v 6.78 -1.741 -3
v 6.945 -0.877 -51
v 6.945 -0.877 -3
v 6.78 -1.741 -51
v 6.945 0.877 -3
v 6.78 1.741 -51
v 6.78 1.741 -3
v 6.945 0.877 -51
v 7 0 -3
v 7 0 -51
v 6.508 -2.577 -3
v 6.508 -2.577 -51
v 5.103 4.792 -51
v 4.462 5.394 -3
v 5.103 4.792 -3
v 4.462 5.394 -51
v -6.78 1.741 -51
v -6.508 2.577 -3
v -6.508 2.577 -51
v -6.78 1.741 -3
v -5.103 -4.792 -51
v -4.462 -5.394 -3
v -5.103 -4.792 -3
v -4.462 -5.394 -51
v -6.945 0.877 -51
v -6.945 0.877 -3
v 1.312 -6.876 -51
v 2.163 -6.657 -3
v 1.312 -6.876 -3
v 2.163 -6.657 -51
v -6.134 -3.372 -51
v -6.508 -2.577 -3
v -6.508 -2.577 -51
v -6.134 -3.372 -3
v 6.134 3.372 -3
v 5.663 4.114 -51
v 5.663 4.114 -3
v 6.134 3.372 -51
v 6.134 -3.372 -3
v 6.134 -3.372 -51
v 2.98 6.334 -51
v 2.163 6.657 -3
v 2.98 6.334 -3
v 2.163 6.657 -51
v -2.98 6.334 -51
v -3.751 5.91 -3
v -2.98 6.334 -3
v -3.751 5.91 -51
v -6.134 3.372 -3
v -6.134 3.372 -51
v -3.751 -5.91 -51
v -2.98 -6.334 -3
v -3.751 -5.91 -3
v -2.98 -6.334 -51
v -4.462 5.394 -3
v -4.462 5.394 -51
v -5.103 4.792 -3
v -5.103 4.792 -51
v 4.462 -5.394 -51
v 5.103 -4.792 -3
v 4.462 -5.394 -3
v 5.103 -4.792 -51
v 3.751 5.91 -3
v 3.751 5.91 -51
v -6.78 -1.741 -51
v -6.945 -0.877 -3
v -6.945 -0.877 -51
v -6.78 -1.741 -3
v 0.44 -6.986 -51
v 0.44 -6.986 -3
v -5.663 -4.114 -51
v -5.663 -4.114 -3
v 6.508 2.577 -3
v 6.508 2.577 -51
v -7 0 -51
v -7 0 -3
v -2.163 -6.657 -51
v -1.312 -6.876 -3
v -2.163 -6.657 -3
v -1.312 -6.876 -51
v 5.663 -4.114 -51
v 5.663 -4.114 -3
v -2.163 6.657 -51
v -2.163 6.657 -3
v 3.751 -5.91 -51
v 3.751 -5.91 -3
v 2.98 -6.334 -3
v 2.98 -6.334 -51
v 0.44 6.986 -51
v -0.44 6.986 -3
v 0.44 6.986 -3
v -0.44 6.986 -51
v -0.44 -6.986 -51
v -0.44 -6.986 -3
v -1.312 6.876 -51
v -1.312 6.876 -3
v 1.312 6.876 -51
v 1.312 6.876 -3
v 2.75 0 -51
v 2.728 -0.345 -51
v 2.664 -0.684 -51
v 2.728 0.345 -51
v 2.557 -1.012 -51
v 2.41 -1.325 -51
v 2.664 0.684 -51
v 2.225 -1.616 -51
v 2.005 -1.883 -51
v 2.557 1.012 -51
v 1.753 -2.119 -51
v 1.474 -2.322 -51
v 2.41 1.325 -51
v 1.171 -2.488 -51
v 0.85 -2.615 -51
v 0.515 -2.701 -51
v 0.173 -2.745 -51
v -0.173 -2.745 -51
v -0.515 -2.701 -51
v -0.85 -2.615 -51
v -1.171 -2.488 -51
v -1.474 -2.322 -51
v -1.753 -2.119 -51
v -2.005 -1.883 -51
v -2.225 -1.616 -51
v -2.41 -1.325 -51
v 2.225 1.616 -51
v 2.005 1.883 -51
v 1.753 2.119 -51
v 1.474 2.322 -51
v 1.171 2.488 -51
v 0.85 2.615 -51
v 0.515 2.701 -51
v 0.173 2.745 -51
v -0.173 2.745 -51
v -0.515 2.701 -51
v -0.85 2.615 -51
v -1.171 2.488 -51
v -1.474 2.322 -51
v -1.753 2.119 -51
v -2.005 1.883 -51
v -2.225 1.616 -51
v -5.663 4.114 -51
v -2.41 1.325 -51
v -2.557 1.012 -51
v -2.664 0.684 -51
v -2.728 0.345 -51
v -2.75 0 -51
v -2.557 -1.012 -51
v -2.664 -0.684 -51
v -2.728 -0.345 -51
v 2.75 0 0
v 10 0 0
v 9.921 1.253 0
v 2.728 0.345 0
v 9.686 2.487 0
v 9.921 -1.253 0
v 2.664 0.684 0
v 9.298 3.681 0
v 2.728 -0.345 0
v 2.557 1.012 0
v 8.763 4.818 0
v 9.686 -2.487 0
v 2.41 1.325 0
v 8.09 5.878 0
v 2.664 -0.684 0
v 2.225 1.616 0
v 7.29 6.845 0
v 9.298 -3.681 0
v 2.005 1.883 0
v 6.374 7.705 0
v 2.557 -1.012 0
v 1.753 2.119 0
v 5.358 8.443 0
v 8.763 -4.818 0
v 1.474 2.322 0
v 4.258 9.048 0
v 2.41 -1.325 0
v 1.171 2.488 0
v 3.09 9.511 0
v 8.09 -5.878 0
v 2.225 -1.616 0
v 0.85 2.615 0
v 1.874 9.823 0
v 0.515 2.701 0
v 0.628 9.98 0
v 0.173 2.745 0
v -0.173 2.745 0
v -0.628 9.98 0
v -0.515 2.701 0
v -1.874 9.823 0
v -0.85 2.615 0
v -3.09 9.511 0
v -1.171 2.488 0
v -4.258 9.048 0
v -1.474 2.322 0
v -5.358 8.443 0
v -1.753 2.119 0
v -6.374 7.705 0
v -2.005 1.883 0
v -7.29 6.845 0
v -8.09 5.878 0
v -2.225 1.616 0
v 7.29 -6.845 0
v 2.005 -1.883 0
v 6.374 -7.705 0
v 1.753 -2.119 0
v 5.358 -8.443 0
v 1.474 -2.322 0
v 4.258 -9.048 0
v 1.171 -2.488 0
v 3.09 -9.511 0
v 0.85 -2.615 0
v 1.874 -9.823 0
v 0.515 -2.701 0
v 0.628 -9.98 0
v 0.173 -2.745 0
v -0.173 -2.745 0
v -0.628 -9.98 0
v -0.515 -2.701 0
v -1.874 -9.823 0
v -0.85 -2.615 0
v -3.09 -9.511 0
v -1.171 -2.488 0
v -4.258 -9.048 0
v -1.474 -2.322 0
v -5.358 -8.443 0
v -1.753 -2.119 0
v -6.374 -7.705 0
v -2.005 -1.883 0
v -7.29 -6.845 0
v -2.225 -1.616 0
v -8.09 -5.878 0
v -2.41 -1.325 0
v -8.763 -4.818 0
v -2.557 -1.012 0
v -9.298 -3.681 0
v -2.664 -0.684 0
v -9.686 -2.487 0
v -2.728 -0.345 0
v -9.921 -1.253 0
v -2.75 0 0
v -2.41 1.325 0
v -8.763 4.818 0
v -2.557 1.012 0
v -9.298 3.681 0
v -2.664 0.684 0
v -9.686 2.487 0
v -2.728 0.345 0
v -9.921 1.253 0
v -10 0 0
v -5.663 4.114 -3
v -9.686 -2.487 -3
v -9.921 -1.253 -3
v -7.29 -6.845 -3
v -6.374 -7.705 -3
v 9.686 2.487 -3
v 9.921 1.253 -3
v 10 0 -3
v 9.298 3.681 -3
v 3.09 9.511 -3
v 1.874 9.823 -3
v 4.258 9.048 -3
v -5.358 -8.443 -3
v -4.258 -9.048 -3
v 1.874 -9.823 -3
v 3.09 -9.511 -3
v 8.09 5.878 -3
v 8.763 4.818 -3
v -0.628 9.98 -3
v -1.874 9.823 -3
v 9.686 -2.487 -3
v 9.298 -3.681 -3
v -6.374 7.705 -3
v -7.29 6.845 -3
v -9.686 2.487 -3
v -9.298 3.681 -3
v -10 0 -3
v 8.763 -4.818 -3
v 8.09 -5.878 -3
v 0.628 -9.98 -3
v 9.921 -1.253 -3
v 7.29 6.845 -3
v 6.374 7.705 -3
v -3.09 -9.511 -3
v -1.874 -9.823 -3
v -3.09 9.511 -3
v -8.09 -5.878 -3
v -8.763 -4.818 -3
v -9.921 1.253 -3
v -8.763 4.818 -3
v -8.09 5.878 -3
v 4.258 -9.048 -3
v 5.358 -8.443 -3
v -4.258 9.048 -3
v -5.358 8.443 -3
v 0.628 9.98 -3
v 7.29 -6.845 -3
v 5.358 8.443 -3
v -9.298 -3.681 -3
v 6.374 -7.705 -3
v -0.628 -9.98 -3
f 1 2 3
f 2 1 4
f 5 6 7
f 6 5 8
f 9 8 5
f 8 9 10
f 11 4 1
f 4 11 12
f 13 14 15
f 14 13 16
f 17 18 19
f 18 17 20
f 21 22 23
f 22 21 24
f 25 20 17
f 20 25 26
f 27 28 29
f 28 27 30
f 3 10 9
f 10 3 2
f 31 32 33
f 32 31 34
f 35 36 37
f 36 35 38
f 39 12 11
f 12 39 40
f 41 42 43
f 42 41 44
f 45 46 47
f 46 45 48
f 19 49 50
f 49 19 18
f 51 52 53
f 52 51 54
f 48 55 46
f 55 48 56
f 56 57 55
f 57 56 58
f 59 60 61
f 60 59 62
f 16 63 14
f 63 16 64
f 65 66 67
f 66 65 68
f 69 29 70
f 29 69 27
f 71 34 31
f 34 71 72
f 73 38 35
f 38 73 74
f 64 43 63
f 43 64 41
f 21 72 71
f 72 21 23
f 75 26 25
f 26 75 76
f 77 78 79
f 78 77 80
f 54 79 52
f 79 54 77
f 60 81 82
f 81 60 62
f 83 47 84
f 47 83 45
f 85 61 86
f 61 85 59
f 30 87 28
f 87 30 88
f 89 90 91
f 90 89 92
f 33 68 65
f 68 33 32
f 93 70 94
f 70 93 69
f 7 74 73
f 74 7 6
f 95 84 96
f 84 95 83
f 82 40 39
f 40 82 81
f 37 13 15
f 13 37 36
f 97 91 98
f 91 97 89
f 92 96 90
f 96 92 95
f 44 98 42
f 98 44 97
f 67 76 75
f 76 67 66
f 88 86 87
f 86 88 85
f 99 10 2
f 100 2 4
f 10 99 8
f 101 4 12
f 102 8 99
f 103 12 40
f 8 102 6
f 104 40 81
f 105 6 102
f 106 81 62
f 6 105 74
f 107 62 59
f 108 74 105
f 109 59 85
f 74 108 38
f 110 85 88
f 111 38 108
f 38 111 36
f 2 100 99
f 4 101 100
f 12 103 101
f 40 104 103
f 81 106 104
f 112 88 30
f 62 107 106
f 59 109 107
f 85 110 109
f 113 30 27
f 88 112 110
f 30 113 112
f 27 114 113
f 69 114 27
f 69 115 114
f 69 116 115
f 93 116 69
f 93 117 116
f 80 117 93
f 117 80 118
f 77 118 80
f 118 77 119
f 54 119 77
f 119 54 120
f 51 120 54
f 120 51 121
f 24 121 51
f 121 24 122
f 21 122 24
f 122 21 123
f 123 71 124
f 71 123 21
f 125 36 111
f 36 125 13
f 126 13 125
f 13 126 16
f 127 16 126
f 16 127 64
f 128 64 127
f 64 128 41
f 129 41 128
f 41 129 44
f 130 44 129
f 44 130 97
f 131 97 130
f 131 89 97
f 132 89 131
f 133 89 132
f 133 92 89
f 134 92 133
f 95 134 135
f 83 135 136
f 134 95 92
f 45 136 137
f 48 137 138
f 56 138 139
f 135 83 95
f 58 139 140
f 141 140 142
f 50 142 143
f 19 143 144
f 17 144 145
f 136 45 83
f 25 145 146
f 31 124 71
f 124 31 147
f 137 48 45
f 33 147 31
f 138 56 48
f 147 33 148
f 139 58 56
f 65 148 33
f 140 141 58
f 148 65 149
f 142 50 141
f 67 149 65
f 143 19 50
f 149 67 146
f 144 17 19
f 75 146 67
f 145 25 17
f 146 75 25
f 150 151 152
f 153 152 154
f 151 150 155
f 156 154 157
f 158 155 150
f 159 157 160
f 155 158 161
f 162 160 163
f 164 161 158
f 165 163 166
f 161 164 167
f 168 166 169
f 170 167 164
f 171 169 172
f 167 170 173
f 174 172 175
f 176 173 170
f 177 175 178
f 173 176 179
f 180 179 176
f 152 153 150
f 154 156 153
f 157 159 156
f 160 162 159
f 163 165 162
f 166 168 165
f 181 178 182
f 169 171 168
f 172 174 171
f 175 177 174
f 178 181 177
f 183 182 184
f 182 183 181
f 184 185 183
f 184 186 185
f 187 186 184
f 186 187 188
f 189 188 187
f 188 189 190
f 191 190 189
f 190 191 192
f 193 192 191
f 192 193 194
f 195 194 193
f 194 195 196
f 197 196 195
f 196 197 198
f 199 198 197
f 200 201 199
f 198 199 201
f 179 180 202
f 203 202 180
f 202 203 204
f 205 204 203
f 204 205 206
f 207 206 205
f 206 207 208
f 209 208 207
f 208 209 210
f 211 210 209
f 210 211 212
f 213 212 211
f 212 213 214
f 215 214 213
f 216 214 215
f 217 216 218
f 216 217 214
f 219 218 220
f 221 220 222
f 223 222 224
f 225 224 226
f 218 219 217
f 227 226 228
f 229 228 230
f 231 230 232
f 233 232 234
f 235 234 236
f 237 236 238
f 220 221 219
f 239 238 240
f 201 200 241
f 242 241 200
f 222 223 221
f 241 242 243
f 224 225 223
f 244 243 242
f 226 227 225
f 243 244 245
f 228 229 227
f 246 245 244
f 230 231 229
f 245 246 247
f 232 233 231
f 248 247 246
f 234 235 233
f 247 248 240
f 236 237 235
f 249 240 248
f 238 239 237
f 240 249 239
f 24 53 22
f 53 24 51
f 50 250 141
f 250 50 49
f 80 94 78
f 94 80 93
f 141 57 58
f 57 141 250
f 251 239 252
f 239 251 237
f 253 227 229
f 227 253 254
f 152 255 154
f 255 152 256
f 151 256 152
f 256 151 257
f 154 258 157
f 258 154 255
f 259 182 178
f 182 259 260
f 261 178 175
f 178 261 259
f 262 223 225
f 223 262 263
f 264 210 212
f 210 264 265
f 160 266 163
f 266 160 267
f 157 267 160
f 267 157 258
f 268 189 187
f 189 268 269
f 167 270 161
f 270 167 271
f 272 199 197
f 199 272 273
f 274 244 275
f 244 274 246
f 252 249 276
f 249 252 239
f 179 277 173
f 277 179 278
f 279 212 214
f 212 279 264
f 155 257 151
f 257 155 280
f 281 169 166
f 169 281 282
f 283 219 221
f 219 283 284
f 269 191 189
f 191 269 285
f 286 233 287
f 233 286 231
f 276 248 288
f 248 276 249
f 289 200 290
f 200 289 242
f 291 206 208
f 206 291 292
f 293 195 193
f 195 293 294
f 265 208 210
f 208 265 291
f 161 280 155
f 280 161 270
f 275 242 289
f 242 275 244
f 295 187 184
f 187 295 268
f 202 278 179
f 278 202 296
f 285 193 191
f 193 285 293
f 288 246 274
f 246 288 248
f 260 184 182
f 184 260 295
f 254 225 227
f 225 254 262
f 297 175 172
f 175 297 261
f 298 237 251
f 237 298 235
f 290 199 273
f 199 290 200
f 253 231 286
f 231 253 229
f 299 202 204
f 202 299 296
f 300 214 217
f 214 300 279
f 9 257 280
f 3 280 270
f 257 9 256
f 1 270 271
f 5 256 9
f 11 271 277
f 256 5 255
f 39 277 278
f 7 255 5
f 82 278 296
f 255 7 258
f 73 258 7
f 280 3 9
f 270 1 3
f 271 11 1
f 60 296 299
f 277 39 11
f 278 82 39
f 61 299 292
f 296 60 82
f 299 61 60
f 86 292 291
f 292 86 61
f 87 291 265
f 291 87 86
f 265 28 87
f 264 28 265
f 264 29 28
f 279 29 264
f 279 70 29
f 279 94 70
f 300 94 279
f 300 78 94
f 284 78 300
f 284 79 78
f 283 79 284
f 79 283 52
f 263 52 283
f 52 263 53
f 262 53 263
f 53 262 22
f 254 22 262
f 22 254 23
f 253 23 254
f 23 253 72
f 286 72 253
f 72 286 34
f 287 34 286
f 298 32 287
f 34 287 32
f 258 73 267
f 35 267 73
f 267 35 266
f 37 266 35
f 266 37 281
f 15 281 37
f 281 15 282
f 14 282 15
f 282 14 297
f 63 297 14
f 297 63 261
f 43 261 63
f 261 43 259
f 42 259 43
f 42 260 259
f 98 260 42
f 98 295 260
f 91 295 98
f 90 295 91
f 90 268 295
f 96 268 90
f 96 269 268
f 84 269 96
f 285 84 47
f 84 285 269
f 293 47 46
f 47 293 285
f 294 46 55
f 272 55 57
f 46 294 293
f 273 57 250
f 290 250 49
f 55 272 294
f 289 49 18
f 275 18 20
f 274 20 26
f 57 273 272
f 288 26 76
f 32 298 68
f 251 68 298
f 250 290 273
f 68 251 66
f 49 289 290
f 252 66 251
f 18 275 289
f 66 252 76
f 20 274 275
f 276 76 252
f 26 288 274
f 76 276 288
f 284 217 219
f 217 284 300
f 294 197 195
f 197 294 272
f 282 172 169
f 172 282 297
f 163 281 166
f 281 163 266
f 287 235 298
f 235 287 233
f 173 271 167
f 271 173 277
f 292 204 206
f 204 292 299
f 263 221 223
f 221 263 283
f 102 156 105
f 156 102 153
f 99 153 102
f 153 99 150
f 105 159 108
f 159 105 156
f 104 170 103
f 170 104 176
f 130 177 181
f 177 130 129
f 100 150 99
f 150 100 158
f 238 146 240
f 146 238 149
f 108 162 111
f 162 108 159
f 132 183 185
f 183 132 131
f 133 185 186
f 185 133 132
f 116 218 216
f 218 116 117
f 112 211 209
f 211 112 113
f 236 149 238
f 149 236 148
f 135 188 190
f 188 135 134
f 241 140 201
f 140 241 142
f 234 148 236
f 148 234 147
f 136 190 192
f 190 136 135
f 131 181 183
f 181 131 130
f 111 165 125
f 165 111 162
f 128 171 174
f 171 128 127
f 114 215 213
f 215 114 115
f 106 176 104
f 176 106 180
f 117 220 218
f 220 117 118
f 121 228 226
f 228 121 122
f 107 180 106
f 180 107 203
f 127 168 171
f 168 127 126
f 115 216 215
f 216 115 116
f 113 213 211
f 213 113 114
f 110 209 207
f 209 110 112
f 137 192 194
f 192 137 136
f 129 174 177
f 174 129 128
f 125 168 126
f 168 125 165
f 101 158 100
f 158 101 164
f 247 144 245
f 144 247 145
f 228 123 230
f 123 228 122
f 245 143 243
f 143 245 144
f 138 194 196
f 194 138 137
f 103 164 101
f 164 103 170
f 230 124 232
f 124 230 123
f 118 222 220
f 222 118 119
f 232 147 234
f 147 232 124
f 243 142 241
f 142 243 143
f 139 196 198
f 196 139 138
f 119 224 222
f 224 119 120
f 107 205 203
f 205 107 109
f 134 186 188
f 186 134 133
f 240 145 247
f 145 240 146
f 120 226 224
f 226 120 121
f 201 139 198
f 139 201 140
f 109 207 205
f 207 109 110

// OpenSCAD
$fn = 50;


difference() {
	union() {
		translate(v = [0, 0, -51.0000000000]) {
			cylinder(h = 51, r = 7.0000000000);
		}
		translate(v = [0, 0, -3.0000000000]) {
			cylinder(h = 3, r = 10.0000000000);
		}
	}
	union() {
		#translate(v = [0, 0, -51]) {
			cylinder(h = 51, r = 2.7500000000);
		}
	}
}
